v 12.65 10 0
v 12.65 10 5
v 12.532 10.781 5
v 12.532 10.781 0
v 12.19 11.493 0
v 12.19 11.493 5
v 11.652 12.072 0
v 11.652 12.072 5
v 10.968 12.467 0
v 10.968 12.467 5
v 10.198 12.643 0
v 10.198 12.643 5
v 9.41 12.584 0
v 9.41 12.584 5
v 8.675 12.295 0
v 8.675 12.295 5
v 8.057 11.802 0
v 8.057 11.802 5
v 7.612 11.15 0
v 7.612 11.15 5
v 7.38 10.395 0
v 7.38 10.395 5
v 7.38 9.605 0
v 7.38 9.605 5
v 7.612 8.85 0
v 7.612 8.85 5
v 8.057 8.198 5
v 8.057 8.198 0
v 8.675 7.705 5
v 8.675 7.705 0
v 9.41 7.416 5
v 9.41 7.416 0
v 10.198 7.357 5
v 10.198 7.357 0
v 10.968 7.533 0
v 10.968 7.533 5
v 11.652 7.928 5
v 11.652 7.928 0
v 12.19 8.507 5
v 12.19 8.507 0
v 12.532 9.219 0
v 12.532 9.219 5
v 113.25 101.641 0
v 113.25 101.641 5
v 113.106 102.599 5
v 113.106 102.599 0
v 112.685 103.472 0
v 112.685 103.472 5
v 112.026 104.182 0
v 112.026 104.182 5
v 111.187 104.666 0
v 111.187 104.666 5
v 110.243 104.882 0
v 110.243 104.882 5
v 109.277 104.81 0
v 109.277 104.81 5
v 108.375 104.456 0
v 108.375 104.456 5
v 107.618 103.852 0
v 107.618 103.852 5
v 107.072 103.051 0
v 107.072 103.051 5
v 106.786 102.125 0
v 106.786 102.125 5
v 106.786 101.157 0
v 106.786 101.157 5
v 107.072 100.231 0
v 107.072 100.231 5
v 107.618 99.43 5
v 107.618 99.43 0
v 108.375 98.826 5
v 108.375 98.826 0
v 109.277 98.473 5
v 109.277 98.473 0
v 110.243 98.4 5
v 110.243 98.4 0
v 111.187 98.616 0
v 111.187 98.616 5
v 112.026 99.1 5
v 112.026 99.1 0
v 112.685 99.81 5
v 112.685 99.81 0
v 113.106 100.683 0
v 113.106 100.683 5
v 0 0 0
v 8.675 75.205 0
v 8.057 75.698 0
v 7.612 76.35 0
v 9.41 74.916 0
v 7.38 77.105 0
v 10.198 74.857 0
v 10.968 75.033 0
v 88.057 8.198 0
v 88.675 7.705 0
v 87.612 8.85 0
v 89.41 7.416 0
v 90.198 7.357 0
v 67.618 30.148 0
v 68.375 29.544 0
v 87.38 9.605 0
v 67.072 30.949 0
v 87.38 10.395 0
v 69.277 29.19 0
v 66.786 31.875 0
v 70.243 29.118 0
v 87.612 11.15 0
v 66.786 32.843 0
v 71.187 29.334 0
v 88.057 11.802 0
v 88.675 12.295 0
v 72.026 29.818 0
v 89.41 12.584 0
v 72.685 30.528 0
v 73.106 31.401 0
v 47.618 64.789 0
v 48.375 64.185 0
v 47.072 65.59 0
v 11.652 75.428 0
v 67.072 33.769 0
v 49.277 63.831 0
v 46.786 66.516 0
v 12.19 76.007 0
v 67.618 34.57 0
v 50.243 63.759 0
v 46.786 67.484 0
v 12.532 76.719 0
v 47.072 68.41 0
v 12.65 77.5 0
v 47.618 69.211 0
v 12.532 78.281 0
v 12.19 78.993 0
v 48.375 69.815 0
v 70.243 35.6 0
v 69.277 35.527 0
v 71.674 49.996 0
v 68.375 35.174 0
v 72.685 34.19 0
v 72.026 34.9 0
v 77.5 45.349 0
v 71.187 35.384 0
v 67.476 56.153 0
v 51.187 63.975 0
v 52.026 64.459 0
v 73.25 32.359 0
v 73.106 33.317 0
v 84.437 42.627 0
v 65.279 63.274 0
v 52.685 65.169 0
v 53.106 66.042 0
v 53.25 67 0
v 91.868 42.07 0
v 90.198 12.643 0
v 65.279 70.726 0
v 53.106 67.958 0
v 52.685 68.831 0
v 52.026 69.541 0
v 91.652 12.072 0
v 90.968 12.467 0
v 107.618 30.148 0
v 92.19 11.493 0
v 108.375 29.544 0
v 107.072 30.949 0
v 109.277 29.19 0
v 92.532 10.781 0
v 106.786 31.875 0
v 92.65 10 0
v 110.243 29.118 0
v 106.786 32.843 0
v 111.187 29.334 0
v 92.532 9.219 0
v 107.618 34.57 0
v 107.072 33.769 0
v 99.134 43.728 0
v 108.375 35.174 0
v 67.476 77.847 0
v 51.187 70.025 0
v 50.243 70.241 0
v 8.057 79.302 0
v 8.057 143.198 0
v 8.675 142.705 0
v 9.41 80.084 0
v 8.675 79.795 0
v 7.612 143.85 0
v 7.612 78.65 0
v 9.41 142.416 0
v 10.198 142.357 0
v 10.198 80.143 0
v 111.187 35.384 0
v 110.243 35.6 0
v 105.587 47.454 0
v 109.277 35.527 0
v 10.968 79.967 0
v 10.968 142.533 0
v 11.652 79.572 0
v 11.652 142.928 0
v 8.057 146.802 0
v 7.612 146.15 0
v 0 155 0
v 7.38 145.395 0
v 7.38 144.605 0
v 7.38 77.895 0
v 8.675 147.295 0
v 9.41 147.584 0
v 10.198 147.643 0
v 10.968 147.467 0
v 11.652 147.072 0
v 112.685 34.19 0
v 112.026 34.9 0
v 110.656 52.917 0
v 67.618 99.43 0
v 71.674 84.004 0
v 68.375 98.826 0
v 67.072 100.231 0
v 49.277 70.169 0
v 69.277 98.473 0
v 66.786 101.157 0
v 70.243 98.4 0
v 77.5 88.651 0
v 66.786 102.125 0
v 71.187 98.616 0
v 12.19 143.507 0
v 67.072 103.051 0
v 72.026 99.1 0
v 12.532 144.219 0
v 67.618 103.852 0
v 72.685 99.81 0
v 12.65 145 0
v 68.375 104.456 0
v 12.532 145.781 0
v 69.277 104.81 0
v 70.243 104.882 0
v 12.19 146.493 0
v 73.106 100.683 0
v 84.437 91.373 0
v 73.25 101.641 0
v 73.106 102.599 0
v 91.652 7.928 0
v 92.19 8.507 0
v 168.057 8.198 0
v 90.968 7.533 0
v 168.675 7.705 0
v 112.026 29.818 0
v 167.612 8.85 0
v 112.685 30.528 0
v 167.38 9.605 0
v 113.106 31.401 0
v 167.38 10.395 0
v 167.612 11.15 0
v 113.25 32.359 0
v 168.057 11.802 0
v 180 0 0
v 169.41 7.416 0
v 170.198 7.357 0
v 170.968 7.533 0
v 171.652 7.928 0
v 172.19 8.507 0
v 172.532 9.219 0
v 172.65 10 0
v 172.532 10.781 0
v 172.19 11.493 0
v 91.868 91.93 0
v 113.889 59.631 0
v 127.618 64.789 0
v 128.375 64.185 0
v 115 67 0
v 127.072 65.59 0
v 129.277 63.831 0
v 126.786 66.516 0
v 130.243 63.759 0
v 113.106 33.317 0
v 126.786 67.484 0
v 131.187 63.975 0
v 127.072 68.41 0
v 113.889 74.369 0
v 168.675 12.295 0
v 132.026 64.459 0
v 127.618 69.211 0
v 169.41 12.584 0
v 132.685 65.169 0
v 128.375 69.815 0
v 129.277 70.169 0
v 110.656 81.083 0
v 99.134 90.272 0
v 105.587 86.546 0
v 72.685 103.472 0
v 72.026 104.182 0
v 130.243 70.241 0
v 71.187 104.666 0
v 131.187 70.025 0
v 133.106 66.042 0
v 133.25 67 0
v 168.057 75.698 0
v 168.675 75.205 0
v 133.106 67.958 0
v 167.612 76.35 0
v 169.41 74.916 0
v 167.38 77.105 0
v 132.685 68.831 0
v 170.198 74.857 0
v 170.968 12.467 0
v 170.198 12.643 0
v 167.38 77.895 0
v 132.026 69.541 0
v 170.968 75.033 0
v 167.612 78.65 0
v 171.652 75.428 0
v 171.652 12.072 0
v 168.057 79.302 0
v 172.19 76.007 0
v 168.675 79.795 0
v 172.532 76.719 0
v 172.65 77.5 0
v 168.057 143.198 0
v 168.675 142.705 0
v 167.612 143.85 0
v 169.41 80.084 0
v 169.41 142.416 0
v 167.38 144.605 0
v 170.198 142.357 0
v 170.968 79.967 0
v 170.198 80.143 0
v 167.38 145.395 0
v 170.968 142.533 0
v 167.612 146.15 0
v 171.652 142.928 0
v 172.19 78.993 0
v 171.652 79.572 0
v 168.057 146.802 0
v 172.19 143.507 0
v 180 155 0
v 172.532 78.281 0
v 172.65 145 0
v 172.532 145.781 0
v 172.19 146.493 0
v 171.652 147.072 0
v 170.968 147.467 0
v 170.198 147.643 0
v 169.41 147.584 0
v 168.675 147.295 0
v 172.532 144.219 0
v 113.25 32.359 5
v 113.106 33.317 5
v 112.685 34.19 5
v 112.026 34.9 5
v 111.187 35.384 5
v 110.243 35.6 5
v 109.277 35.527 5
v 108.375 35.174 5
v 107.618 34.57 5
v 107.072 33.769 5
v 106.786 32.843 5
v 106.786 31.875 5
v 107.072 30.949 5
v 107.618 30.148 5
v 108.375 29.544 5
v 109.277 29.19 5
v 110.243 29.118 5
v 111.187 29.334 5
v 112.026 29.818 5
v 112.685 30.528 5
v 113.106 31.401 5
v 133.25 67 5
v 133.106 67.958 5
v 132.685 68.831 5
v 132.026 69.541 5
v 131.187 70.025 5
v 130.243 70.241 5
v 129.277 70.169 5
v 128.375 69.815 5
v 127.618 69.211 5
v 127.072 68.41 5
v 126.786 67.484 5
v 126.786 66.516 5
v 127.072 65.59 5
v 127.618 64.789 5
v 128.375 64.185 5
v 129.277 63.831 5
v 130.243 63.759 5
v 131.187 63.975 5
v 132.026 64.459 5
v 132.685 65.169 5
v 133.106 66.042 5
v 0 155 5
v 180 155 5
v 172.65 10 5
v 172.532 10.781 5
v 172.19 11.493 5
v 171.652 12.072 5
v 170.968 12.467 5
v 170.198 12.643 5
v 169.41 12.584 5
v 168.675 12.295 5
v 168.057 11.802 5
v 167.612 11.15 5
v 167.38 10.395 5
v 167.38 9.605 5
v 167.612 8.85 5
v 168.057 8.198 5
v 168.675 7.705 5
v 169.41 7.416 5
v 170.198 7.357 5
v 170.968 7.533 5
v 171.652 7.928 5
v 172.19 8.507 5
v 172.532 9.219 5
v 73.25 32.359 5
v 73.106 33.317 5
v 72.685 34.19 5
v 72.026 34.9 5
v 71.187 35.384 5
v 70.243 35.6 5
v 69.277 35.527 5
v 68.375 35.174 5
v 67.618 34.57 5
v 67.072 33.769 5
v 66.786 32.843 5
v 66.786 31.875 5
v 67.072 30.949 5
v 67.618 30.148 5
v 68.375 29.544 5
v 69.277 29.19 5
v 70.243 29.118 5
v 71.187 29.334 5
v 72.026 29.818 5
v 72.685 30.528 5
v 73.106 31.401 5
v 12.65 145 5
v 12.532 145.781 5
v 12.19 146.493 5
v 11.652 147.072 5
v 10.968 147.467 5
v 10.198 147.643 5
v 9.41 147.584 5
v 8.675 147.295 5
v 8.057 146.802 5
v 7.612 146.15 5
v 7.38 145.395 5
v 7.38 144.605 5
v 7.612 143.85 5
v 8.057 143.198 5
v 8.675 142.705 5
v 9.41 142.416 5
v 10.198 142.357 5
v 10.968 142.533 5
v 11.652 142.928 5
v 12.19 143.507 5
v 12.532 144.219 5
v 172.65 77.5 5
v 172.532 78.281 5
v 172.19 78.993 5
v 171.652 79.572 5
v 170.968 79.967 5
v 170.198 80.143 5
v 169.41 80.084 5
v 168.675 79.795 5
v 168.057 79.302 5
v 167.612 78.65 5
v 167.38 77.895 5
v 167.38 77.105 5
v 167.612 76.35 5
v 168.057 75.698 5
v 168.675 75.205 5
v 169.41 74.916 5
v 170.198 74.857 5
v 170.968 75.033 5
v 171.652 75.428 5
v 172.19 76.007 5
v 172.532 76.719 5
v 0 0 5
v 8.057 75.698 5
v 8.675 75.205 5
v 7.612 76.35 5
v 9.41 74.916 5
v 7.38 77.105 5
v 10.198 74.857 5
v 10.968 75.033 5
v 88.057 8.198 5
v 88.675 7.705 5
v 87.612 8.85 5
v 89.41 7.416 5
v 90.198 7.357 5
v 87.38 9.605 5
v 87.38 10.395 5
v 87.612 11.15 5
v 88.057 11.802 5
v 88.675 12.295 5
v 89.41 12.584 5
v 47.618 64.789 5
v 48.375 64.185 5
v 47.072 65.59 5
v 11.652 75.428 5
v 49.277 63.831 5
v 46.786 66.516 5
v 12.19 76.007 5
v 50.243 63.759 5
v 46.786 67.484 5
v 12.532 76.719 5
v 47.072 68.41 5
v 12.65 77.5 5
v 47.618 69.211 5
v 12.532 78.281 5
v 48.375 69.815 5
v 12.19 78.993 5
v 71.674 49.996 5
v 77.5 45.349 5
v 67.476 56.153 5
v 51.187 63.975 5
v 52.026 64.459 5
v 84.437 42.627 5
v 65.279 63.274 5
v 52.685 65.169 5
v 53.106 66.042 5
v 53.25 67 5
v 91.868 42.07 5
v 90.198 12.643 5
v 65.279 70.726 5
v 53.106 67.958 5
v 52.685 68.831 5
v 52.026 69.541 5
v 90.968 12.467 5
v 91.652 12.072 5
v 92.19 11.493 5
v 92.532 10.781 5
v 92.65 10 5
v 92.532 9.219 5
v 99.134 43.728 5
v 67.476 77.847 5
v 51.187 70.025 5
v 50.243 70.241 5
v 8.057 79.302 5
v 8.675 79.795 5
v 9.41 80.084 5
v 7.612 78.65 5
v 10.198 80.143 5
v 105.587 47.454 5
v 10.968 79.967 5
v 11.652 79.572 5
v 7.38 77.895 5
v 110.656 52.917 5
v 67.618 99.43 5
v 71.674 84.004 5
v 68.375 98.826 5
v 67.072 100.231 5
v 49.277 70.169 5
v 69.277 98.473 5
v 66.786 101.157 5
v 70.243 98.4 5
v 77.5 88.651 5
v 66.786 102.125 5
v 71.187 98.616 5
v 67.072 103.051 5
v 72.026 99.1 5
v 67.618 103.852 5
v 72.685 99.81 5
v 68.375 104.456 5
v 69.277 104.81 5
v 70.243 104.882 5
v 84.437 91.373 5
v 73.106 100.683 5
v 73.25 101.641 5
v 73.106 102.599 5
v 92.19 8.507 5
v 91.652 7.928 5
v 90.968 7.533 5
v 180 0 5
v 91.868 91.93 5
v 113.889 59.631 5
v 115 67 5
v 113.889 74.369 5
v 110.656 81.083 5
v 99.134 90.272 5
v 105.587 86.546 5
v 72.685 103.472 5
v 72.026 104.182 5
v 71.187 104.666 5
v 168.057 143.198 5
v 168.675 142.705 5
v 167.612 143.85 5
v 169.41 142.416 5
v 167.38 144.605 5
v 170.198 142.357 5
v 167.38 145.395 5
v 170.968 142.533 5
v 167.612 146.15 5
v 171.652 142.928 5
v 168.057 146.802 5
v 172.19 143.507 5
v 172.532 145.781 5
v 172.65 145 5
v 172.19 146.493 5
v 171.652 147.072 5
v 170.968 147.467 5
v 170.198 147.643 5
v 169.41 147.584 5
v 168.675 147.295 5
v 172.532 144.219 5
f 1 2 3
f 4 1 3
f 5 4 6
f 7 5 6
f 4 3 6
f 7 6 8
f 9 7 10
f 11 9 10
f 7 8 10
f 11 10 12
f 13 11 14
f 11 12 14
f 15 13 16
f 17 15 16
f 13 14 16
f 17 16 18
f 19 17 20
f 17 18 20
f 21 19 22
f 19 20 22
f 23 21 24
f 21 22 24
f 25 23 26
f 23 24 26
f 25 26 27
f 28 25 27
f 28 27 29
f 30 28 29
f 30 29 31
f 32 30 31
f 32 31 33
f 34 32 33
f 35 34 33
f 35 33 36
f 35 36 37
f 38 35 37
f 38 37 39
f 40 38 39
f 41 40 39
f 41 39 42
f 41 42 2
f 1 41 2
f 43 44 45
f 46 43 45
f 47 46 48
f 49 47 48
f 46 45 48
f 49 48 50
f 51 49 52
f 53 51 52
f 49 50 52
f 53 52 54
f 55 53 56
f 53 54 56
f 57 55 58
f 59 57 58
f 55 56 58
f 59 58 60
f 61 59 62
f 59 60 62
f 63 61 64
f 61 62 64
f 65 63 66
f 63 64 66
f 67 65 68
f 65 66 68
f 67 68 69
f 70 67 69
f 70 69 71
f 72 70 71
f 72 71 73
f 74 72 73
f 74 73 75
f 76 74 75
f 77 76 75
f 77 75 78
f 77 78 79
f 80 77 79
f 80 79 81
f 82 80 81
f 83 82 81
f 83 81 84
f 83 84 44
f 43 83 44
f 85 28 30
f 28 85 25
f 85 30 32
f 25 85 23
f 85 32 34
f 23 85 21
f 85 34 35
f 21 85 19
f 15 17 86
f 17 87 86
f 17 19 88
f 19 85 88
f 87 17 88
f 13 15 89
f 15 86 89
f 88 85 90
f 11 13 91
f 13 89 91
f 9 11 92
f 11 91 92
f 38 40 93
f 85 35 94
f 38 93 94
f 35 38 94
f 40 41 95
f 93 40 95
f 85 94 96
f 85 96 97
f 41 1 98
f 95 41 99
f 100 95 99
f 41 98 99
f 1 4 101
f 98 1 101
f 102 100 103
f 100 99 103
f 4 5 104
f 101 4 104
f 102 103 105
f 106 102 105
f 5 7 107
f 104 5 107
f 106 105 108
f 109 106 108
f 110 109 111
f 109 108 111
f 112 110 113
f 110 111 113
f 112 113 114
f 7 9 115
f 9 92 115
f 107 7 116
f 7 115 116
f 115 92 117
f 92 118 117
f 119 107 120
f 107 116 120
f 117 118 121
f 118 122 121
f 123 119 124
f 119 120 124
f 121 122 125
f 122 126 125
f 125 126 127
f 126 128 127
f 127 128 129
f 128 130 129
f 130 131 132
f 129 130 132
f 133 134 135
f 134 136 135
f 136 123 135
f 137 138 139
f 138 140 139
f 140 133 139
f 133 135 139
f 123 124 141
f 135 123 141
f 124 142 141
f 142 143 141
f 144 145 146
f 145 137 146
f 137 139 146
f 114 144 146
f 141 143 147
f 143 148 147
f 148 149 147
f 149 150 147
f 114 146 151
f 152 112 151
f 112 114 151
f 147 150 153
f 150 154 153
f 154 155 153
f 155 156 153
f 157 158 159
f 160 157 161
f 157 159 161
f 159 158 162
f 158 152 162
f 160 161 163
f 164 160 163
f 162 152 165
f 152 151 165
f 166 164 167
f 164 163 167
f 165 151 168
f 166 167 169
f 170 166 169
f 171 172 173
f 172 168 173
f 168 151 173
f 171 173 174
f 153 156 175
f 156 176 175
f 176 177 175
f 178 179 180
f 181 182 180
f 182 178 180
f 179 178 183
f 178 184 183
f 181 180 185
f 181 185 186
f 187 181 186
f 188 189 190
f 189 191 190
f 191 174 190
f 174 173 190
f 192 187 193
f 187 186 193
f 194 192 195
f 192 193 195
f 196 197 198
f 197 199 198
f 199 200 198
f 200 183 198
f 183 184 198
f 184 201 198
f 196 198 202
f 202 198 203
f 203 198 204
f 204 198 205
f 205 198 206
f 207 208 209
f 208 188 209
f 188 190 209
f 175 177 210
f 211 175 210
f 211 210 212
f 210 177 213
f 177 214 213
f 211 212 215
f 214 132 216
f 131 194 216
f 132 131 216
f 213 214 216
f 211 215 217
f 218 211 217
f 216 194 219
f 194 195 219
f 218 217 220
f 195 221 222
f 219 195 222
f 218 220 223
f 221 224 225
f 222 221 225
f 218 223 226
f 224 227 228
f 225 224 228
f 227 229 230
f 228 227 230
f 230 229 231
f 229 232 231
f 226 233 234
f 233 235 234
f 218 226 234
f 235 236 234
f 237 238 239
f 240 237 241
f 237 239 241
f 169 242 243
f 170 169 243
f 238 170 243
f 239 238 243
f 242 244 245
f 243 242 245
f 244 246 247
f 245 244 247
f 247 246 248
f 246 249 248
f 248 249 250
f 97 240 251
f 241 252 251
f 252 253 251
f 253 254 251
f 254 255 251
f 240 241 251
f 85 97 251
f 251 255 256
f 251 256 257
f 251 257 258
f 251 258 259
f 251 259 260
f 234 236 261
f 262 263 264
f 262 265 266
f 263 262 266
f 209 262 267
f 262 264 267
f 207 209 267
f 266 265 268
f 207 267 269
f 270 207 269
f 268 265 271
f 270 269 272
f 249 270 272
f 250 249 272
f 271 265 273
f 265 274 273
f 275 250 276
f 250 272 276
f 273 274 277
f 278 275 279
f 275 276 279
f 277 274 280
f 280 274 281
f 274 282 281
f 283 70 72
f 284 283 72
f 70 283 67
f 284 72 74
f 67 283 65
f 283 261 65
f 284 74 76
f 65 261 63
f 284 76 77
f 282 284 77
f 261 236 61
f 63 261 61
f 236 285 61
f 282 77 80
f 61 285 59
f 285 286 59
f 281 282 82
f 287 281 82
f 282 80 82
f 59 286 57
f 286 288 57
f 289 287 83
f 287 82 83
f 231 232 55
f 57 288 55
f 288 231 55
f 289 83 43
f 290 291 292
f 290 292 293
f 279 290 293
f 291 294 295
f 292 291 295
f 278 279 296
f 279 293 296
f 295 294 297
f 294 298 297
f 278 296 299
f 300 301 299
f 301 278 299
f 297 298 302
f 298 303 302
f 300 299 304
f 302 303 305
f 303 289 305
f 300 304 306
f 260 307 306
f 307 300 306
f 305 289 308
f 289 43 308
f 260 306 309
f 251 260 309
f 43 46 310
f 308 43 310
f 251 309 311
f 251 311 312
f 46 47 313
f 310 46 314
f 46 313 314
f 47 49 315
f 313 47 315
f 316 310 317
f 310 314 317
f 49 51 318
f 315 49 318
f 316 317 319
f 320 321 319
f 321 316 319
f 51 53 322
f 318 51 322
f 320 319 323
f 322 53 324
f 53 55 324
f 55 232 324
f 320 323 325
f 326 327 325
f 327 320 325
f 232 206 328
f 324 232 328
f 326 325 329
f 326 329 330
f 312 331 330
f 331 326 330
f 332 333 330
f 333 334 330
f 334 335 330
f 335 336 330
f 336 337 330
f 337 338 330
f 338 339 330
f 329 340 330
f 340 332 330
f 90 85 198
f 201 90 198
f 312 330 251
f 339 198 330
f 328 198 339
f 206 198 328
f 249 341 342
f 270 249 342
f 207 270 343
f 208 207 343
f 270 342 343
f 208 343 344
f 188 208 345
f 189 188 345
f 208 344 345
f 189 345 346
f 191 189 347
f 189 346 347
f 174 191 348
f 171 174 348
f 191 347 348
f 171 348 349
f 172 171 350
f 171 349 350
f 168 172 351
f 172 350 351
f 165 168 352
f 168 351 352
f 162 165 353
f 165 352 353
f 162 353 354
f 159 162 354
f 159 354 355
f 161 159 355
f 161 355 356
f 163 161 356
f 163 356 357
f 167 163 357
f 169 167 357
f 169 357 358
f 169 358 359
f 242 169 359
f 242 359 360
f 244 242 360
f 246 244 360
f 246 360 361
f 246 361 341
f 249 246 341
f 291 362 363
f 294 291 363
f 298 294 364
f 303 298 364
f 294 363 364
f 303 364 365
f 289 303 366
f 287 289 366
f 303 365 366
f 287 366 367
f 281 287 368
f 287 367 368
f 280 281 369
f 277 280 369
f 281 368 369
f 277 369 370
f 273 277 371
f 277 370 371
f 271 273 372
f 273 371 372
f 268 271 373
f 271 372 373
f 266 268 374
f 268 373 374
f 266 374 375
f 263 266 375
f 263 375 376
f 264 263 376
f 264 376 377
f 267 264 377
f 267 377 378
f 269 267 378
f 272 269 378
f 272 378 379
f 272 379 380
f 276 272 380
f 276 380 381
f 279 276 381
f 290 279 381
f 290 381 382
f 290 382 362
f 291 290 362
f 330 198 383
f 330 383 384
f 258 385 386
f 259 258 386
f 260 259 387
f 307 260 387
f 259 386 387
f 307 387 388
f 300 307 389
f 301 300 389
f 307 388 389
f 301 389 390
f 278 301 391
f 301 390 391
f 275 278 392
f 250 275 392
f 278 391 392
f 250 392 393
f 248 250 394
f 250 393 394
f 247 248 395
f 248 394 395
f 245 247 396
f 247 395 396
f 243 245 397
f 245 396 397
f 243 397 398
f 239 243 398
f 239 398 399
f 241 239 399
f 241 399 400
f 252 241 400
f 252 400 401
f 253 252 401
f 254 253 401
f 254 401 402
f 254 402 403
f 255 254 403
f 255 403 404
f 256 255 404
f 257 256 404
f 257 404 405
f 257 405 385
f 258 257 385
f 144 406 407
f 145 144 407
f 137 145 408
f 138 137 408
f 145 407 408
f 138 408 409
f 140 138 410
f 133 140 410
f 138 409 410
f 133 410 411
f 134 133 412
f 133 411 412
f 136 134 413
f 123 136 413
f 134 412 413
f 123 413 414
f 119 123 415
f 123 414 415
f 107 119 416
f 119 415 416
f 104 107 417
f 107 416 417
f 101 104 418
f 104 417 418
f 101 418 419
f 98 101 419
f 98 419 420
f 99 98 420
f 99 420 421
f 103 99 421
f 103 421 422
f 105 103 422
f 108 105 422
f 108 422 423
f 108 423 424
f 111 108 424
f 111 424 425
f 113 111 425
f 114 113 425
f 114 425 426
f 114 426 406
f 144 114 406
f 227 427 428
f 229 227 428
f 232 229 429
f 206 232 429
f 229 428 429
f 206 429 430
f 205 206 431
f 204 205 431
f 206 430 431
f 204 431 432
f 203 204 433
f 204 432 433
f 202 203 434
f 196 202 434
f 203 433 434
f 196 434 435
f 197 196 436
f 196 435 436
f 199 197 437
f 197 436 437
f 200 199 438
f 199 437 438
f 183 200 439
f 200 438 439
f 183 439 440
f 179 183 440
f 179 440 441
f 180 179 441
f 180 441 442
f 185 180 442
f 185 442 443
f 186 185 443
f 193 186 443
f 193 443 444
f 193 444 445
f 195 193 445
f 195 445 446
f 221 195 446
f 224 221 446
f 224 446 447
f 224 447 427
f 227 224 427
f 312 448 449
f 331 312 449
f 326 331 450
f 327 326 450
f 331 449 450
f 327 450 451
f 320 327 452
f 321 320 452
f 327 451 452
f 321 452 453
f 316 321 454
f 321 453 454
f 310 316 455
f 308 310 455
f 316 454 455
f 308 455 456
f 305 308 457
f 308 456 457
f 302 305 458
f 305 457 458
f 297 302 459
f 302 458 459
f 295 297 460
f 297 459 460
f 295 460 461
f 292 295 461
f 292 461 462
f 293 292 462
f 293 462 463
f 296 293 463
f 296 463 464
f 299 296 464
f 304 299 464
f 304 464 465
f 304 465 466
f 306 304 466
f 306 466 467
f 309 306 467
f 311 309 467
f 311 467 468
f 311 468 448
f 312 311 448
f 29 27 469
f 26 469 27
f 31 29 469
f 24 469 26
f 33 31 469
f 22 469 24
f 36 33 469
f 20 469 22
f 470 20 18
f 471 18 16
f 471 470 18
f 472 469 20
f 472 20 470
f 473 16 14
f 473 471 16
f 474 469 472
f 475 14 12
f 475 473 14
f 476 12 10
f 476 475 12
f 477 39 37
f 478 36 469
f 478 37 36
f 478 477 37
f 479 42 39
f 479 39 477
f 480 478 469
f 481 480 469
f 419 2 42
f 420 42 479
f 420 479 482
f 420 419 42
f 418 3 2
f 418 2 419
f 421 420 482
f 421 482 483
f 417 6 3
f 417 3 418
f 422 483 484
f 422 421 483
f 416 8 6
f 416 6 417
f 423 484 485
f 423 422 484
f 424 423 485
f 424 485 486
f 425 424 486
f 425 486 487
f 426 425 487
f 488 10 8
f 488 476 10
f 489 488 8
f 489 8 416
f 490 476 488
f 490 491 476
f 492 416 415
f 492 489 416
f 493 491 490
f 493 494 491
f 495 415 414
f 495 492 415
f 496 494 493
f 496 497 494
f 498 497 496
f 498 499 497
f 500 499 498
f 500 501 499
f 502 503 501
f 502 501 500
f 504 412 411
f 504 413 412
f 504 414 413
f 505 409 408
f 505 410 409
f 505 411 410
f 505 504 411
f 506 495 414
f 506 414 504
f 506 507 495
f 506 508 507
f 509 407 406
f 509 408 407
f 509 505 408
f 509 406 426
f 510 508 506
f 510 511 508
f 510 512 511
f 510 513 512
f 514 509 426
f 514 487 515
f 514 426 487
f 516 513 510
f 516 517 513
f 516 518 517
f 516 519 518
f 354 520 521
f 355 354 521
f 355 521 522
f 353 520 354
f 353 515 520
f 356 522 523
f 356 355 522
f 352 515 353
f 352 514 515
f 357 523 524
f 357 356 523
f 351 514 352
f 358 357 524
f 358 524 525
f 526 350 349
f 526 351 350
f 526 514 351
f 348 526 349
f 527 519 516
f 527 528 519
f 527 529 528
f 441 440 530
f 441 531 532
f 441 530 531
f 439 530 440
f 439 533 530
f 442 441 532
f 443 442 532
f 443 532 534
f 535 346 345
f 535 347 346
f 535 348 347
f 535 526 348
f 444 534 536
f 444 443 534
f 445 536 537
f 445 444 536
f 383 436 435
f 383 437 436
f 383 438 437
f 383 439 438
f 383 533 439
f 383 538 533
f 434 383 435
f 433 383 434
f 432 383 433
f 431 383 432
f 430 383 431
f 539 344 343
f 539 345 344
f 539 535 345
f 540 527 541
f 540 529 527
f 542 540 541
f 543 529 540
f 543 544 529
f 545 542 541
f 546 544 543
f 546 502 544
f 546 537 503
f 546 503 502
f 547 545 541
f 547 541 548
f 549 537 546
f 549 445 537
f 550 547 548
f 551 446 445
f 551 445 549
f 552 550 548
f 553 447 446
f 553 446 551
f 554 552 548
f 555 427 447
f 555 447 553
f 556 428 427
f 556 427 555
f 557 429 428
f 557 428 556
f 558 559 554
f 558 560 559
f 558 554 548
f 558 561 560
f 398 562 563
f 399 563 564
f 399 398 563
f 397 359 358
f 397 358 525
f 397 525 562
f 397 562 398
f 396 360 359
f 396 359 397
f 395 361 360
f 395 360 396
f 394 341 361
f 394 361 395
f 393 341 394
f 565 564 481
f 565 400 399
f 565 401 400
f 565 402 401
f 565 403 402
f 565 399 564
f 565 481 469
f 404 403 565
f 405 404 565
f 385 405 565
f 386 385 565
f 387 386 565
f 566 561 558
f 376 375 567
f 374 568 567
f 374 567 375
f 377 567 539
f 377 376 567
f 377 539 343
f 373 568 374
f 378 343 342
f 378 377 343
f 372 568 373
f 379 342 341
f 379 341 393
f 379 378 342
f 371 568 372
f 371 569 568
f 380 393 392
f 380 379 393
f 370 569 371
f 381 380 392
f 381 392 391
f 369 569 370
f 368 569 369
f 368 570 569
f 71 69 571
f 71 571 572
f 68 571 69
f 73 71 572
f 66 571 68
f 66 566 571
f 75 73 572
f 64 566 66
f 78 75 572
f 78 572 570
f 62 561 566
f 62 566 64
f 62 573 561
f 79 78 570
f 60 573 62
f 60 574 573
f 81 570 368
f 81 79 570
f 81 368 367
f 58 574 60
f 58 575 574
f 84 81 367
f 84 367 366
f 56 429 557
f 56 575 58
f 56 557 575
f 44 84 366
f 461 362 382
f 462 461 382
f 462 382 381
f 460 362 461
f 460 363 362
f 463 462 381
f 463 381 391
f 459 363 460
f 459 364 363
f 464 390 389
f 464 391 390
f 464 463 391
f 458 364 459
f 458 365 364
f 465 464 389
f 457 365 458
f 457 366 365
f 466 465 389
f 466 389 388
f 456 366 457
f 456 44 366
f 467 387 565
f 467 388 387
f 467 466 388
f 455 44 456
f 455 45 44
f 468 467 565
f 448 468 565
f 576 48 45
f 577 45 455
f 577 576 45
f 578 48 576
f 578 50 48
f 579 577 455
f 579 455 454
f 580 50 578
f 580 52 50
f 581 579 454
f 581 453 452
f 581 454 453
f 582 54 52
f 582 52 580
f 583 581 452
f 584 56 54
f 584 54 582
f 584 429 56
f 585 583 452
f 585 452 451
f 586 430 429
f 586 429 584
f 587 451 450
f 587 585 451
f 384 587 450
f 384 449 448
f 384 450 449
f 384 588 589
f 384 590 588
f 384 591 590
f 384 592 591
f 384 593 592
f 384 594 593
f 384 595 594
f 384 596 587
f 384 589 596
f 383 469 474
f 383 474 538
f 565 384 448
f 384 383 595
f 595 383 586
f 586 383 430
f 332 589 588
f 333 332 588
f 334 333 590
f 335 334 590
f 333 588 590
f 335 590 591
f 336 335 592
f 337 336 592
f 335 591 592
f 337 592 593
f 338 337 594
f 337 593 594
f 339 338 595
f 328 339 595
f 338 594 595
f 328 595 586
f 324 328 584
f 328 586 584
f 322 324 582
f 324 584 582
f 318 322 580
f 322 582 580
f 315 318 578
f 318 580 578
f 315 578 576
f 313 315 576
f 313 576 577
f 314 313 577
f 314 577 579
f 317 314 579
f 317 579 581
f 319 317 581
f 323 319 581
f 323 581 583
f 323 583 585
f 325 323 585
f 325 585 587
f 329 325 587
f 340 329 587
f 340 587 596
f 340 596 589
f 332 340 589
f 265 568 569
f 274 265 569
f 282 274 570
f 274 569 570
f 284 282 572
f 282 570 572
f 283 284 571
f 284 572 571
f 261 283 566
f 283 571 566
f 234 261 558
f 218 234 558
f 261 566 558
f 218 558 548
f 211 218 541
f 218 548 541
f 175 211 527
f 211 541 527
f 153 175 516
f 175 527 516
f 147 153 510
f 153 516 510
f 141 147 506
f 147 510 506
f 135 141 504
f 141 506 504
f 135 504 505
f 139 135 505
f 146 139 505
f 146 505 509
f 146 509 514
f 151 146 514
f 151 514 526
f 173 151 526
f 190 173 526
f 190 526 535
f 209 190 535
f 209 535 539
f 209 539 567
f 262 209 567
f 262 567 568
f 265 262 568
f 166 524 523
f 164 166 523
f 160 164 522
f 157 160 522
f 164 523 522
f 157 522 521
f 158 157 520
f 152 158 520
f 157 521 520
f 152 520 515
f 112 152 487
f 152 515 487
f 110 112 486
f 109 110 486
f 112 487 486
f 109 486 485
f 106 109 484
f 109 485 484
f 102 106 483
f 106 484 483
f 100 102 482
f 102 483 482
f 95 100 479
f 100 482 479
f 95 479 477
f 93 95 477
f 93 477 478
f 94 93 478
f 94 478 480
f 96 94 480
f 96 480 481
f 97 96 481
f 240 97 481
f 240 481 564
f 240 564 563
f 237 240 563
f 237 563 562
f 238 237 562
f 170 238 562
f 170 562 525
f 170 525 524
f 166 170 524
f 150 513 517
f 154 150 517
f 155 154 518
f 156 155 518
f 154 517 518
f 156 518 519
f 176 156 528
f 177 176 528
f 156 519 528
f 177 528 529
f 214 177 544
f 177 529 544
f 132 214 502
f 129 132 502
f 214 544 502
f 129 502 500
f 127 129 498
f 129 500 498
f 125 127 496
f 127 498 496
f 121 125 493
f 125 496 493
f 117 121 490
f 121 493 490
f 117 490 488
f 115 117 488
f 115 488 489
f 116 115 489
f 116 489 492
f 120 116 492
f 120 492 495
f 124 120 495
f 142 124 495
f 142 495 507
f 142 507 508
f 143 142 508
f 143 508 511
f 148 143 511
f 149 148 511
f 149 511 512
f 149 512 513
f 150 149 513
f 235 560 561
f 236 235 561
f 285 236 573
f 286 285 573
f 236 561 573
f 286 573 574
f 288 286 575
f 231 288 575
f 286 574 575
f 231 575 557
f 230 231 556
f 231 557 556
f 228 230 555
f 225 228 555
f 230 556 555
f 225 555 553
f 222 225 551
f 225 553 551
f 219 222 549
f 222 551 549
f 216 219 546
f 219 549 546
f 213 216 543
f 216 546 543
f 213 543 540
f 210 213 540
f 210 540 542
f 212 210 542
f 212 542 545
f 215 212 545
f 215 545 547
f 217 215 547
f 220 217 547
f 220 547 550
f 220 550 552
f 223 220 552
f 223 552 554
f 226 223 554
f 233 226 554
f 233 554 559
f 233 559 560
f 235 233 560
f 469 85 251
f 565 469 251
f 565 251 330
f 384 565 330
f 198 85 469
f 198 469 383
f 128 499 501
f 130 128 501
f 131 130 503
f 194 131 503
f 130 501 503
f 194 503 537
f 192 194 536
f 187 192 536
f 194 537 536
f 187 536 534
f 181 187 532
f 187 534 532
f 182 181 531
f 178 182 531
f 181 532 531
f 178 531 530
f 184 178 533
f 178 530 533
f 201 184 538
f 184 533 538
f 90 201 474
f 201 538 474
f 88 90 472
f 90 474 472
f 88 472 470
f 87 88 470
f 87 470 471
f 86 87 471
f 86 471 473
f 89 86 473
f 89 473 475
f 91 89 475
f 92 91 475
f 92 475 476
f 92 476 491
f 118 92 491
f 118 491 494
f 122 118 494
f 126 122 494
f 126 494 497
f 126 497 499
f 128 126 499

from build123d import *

# Parameters (mm, degrees)
SKETCH1_W           = 180
SKETCH1_H           = 155
BOSS_EXTRUDE1_DEPTH = 5
SKETCH2_R           = 25
CUT_EXTRUDE1_DEPTH  = 6
SKETCH3_R           = 3.25
SKETCH3_R_2         = 2.65
CUT_EXTRUDE2_DEPTH  = 6


with BuildPart() as part:
    # Sketch1 → Boss-Extrude1 (new body)
    with BuildSketch(Plane.XY):
        with Locations((90, 77.5)):
            Rectangle(SKETCH1_W, SKETCH1_H)
    extrude(amount=BOSS_EXTRUDE1_DEPTH)

    # Sketch2 → Cut-Extrude1 (cut, through all)
    with BuildSketch(Plane.XY.offset(5)):
        with Locations((90, 67)):
            Circle(SKETCH2_R)
    extrude(amount=-CUT_EXTRUDE1_DEPTH, mode=Mode.SUBTRACT)

    # Sketch3 → Cut-Extrude2 (cut, through all)
    with BuildSketch(Plane.XY.offset(5)):
        with Locations((110, 101.641016151)):
            Circle(SKETCH3_R)
        with Locations((130, 67)):
            Circle(SKETCH3_R)
        with Locations((110, 32.358983849)):
            Circle(SKETCH3_R)
        with Locations((70, 32.358983849)):
            Circle(SKETCH3_R)
        with Locations((50, 67)):
            Circle(SKETCH3_R)
        with Locations((70, 101.641016151)):
            Circle(SKETCH3_R)
        with Locations((10, 145)):
            Circle(SKETCH3_R_2)
        with Locations((10, 77.5)):
            Circle(SKETCH3_R_2)
        with Locations((10, 10)):
            Circle(SKETCH3_R_2)
        with Locations((170, 10)):
            Circle(SKETCH3_R_2)
        with Locations((170, 77.5)):
            Circle(SKETCH3_R_2)
        with Locations((170, 145)):
            Circle(SKETCH3_R_2)
        with Locations((90, 10)):
            Circle(SKETCH3_R_2)
    extrude(amount=-CUT_EXTRUDE2_DEPTH, mode=Mode.SUBTRACT)


solid = part.part
